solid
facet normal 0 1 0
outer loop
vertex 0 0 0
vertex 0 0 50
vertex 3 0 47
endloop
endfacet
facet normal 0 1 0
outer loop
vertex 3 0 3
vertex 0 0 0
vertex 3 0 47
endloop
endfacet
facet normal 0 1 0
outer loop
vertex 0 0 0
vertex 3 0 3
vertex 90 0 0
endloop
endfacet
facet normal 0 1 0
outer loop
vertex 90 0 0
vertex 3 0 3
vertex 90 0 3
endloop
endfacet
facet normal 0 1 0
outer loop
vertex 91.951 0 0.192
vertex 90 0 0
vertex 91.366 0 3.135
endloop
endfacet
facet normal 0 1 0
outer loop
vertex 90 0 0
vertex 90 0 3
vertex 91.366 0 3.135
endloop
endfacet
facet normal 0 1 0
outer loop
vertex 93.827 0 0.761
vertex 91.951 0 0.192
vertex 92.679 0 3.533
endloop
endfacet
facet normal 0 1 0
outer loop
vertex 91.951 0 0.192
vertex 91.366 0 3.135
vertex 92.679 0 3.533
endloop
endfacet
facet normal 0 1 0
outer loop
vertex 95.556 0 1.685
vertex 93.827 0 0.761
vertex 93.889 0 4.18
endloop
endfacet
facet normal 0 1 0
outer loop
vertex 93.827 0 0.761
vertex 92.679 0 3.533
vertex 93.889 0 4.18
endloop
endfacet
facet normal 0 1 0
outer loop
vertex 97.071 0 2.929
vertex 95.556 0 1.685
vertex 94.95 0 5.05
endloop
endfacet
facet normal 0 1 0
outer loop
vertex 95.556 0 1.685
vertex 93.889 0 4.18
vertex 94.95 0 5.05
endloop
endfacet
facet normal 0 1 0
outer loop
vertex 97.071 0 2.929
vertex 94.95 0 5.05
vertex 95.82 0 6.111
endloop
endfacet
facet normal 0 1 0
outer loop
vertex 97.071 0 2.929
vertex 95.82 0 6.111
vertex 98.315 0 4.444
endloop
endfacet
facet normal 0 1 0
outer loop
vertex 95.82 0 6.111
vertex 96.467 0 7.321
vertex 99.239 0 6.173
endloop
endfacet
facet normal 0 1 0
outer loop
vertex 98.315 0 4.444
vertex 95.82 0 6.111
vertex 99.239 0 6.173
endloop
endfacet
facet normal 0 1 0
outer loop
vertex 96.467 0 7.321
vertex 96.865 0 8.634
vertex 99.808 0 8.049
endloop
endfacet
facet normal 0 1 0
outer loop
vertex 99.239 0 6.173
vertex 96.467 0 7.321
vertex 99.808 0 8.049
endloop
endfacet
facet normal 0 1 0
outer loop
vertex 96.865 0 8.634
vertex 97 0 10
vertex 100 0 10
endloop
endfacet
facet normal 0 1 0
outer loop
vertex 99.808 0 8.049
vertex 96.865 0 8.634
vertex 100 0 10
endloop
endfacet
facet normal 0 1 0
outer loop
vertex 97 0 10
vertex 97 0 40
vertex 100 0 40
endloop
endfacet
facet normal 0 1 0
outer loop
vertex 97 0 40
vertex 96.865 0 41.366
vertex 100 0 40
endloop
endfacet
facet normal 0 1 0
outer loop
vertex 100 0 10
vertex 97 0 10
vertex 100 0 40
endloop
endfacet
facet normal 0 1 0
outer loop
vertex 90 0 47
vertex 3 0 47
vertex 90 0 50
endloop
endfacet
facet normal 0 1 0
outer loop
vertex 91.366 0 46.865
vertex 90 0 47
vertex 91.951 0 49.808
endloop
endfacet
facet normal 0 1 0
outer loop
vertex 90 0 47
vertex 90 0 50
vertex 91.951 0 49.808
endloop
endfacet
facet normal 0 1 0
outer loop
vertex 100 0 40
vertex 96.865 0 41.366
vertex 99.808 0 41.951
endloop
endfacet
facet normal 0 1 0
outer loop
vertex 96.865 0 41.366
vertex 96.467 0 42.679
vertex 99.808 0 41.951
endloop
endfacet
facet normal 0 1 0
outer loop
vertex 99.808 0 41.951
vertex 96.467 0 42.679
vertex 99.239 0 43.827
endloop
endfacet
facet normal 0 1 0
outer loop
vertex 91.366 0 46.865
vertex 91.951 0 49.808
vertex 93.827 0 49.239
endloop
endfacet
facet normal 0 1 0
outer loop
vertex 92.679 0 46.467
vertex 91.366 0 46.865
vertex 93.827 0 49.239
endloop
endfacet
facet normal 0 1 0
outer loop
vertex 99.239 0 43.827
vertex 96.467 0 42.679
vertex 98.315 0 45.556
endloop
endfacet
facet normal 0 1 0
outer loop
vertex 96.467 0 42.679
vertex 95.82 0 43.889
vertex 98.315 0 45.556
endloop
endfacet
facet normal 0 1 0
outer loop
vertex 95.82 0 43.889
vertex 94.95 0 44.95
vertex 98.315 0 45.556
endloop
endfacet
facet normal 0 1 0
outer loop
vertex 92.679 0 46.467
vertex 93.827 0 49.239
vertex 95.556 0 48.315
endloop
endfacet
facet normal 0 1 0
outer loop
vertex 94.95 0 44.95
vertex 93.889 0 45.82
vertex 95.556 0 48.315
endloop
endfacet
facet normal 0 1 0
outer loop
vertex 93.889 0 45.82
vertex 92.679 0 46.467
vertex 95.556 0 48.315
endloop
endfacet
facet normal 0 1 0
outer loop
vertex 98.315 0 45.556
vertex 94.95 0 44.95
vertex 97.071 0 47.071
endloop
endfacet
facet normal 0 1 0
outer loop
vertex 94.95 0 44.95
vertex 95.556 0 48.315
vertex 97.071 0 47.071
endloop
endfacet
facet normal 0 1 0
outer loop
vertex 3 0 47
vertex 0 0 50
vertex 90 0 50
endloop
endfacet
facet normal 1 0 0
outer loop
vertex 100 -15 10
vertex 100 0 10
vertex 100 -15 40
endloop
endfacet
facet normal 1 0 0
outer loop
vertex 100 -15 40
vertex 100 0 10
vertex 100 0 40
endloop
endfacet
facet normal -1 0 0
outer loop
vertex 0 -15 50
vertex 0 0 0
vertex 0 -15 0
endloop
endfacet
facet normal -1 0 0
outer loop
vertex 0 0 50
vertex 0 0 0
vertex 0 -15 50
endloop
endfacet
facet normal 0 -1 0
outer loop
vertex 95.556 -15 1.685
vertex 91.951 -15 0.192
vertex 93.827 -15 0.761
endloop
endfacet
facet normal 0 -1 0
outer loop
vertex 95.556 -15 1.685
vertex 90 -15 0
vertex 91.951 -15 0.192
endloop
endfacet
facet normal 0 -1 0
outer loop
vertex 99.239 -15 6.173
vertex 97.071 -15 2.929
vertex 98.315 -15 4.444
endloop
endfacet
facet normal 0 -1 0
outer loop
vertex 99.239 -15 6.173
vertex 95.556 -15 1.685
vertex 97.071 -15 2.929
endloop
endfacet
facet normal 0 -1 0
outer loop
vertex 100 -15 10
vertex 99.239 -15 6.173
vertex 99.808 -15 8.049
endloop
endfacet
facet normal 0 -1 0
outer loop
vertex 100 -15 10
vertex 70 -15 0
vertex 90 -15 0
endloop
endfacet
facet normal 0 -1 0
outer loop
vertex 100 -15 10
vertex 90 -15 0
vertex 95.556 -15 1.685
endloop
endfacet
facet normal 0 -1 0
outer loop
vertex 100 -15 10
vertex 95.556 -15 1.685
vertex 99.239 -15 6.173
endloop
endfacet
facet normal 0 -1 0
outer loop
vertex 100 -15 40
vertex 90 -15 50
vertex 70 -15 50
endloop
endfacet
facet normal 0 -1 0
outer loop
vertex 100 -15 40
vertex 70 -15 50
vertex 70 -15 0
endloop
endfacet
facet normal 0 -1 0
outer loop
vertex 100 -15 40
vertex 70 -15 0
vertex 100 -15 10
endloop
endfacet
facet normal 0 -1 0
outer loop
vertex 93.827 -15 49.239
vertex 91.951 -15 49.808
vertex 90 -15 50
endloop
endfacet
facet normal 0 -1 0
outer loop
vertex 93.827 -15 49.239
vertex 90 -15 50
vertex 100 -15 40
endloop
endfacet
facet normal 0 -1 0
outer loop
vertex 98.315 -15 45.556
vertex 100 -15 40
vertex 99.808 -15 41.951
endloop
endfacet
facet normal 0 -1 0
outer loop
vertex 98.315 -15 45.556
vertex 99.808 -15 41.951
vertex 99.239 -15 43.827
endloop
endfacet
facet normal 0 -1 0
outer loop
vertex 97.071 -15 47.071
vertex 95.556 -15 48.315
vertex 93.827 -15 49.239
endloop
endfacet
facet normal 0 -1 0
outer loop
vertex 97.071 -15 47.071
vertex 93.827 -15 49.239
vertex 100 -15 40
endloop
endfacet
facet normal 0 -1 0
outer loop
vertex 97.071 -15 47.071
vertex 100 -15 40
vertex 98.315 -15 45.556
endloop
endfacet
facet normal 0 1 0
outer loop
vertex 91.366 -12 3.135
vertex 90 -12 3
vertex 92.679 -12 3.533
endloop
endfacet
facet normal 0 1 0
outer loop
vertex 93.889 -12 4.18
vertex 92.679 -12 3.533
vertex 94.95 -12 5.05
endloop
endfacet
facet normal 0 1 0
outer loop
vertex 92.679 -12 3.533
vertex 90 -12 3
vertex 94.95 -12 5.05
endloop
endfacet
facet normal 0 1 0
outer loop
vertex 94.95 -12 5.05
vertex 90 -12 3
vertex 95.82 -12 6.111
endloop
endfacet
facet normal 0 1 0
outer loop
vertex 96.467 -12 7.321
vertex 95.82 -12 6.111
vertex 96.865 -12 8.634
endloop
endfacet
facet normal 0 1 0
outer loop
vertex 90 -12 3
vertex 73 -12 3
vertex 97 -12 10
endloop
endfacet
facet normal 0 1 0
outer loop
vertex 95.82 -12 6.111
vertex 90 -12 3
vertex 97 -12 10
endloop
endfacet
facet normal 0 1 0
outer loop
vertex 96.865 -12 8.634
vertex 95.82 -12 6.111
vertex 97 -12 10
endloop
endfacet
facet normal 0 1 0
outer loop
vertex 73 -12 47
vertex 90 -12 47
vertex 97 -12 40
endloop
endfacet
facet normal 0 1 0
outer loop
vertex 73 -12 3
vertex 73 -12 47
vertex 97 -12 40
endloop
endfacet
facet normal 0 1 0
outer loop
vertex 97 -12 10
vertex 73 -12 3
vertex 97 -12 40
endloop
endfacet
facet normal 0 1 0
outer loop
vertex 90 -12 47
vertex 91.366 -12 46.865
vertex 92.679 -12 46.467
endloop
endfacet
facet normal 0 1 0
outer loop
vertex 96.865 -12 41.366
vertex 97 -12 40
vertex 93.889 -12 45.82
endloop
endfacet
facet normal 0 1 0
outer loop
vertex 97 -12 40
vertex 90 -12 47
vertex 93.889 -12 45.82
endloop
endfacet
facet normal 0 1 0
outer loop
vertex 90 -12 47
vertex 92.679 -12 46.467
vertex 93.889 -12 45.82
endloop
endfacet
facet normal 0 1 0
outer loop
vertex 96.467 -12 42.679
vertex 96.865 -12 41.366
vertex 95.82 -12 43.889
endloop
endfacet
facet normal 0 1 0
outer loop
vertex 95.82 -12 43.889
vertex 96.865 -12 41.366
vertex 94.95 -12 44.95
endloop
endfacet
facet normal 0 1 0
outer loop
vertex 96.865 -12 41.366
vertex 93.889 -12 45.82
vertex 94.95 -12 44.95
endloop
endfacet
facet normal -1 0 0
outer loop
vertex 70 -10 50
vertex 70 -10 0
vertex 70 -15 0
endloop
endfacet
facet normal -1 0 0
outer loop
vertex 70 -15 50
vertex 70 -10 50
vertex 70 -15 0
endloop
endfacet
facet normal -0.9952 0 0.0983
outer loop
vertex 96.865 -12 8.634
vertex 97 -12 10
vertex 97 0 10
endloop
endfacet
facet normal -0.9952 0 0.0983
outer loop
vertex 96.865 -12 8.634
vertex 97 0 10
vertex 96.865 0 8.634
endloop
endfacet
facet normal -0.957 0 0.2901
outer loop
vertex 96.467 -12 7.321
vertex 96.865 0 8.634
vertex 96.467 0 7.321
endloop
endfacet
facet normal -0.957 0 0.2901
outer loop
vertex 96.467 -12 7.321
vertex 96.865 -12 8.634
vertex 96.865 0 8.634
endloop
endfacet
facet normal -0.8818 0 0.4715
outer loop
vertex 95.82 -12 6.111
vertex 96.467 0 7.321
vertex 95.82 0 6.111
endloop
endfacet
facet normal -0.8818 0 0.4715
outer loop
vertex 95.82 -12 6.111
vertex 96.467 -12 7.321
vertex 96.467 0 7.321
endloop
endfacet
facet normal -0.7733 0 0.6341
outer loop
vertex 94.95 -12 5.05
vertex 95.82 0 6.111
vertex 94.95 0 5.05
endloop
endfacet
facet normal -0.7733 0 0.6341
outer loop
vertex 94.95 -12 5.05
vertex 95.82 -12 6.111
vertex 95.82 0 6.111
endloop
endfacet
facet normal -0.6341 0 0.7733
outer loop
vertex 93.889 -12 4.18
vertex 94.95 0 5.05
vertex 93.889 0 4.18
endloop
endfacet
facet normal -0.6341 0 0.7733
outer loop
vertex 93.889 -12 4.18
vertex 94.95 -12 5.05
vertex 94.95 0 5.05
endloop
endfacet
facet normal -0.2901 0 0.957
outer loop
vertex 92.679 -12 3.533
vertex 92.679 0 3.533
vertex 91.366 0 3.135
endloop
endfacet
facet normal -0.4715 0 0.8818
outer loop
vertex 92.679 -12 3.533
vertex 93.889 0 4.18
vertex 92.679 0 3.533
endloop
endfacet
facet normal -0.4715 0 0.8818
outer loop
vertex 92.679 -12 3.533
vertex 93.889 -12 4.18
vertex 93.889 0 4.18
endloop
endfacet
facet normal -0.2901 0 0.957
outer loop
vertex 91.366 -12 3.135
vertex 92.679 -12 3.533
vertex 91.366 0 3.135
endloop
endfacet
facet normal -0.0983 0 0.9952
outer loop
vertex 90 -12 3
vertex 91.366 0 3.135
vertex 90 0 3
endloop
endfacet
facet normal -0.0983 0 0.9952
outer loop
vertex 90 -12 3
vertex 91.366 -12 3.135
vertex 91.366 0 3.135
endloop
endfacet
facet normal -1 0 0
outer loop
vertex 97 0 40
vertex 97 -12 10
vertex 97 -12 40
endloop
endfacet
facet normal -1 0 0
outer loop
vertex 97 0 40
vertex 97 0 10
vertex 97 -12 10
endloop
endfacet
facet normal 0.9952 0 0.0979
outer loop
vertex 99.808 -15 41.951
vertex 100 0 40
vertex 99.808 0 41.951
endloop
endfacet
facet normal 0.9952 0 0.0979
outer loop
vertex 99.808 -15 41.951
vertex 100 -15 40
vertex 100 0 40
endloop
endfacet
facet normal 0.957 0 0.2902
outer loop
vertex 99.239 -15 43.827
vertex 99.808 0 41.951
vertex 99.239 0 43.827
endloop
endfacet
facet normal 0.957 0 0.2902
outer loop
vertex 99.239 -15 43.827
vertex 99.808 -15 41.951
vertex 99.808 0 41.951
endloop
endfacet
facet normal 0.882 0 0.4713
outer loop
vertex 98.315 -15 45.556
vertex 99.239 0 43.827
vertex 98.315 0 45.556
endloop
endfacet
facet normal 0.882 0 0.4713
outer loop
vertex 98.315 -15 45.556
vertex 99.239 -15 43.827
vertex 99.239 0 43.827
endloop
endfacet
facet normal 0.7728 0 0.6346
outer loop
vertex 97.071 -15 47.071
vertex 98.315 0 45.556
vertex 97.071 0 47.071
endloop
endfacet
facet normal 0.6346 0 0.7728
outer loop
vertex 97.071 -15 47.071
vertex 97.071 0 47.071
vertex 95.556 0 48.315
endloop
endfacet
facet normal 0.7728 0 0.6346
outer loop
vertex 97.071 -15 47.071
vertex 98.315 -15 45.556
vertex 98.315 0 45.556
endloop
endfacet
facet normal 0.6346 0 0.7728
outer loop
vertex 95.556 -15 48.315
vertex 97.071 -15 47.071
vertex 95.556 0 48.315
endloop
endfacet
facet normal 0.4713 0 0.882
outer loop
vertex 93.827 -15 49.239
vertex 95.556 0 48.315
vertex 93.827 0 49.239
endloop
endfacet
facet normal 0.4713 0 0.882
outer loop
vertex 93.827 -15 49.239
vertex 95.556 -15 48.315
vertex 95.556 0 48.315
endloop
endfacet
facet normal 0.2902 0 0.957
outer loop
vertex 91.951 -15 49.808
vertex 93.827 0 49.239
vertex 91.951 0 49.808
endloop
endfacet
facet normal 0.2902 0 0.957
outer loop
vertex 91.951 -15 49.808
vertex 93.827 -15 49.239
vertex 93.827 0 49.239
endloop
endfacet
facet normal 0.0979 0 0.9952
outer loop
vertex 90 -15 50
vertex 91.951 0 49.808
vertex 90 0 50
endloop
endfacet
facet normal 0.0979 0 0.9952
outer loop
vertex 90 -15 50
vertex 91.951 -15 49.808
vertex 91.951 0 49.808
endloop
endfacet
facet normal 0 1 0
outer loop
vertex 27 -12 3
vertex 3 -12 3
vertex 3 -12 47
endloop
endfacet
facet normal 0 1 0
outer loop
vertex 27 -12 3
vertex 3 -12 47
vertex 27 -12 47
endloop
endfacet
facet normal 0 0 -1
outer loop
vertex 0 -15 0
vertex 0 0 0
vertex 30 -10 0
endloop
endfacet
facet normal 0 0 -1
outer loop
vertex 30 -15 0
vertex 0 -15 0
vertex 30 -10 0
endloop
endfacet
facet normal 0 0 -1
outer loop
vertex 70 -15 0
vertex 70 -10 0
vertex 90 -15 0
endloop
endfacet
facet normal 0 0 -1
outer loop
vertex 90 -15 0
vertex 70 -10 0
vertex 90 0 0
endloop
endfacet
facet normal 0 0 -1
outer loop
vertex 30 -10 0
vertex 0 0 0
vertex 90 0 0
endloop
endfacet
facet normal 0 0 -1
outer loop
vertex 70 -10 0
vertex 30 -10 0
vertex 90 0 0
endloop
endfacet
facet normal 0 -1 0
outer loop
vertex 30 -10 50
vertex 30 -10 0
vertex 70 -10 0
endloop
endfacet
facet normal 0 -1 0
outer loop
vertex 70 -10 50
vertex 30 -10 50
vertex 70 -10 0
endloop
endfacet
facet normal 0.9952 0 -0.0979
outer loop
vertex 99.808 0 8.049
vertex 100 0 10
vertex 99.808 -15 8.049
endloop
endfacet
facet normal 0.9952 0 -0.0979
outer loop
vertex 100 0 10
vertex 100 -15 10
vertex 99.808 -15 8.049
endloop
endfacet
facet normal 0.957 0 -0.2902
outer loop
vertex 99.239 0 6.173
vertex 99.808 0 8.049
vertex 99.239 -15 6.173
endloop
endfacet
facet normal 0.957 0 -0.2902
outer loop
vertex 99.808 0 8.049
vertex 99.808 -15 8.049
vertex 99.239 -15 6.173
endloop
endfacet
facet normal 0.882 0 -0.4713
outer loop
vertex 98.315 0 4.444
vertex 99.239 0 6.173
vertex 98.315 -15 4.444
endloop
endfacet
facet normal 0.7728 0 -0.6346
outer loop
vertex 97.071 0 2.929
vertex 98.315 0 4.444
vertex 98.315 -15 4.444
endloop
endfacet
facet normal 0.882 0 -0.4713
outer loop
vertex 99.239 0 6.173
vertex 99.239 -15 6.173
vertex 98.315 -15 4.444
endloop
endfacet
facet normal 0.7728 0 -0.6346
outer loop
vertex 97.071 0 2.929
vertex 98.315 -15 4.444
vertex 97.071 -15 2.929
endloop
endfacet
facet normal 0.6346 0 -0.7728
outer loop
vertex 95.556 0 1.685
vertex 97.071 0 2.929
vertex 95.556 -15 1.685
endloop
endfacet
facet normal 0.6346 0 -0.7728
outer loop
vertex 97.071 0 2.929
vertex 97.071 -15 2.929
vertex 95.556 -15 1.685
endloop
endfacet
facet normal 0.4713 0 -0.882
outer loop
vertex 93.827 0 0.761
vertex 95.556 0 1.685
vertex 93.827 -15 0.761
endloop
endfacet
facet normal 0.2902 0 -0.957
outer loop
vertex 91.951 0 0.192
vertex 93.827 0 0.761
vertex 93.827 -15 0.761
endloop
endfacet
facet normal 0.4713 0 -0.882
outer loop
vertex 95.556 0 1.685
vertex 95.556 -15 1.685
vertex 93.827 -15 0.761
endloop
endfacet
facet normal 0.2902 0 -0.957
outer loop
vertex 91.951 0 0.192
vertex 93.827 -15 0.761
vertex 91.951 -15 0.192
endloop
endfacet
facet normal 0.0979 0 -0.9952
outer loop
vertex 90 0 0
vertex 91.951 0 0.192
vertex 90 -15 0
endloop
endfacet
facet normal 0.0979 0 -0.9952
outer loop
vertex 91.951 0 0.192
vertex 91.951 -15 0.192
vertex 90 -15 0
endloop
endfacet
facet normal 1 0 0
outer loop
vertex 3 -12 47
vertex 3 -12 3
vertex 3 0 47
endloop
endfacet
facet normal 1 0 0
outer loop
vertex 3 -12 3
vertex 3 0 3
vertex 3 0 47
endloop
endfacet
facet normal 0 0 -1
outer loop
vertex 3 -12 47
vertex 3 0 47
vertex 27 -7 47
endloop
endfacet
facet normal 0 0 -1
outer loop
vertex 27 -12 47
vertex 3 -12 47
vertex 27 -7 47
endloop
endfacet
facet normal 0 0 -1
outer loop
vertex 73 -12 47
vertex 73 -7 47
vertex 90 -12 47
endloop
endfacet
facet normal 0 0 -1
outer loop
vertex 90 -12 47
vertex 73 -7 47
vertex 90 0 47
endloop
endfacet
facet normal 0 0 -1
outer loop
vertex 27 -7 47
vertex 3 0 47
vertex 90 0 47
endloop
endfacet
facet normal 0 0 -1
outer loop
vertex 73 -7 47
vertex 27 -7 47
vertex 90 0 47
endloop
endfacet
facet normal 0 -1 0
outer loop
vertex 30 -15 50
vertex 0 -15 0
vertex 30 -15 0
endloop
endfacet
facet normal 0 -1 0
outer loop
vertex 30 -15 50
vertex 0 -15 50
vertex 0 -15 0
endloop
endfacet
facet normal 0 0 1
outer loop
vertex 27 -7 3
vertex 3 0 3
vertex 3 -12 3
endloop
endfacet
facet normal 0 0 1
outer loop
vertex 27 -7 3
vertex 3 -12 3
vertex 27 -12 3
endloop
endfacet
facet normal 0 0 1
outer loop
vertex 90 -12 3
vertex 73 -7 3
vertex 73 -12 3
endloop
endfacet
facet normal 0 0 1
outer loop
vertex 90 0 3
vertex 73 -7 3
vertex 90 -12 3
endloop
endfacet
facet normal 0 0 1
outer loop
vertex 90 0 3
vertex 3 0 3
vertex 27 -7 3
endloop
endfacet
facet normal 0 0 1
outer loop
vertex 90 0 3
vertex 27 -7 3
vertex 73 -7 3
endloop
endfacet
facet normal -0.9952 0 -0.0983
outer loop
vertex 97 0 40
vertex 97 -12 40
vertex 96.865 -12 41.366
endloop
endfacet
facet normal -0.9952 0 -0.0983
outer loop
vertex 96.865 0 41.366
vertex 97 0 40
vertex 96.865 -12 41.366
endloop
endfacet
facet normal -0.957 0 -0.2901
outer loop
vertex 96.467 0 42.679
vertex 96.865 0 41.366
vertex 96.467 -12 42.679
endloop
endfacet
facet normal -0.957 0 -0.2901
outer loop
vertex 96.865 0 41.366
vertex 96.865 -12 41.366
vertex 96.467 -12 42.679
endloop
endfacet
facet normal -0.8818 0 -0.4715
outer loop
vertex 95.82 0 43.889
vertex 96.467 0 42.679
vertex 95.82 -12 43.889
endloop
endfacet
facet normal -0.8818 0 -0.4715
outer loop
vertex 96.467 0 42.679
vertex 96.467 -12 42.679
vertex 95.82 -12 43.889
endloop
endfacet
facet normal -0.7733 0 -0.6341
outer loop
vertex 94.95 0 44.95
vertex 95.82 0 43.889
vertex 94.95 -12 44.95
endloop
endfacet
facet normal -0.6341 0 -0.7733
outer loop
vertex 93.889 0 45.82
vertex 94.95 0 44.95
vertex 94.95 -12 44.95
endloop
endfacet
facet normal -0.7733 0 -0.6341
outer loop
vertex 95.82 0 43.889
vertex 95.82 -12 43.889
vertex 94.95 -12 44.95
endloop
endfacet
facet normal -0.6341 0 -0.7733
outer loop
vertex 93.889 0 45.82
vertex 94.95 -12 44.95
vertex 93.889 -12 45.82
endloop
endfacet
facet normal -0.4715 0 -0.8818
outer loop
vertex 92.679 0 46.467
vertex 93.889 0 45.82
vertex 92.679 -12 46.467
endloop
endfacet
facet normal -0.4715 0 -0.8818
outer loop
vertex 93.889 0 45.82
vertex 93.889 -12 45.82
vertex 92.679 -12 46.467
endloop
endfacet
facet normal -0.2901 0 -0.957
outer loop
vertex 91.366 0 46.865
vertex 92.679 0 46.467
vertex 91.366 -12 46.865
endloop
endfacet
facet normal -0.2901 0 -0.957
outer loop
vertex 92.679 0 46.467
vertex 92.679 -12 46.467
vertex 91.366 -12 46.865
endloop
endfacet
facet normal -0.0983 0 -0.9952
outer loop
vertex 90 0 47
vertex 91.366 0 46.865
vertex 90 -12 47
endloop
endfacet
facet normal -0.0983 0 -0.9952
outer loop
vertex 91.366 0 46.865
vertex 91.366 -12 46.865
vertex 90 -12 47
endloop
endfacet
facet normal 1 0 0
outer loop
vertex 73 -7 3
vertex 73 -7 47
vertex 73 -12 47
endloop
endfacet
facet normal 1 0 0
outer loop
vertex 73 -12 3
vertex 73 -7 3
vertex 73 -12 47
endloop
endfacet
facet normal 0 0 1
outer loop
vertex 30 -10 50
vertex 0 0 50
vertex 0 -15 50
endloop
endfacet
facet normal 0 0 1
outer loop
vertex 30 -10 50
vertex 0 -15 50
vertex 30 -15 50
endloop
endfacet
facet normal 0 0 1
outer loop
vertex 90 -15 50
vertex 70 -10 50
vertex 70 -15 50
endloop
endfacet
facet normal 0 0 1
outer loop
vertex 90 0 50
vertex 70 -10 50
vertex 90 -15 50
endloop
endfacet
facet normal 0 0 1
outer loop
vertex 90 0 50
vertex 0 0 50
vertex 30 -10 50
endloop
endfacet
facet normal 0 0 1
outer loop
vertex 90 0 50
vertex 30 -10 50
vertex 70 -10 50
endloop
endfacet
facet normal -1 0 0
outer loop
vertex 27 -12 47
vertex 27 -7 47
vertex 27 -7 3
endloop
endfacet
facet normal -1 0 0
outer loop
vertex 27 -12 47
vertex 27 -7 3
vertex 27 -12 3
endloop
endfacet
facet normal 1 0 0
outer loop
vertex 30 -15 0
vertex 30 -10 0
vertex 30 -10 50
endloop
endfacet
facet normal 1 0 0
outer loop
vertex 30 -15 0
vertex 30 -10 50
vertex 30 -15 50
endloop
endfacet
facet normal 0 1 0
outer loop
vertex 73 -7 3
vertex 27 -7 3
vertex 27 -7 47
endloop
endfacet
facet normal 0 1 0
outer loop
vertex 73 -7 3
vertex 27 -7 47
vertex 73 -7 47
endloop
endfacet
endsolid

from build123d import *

# Parameters (mm, degrees)
F1_W     = 100
F1_H     = 50
F2_DEPTH = 15
F3_R     = 10
F4_R     = 10
F5_W     = 40
F5_H     = 5
F6_DEPTH = 50.001
F7_T     = -3


with BuildPart() as f2:
    # F1 (on Front) → F2 (new body)
    with BuildSketch(Plane.XZ):
        with Locations((50, 25)):
            Rectangle(F1_W, F1_H)
    extrude(amount=F2_DEPTH)

    # F3
    f3_edges = [f2.edges().sort_by_distance(p)[0] for p in [
        (100, -7.5, 50),
    ]]
    fillet(f3_edges, radius=F3_R)

    # F4
    f4_edges = [f2.edges().sort_by_distance(p)[0] for p in [
        (100, -7.5, 0),
    ]]
    fillet(f4_edges, radius=F4_R)

    # F5 (on face) → F6 (cut, through all)
    with BuildSketch(Plane(origin=(0, 0, 0), x_dir=(1, 0, 0), z_dir=(0, 0, -1))):
        with Locations((50, 12.5)):
            Rectangle(F5_W, F5_H)
    extrude(amount=-F6_DEPTH, mode=Mode.SUBTRACT)

    # F7
    f7_openings = [f2.faces().sort_by_distance(p)[0] for p in [
        (49.58642, 0, 25),
    ]]
    offset(amount=F7_T, openings=f7_openings, kind=Kind.INTERSECTION)


solid = f2.part
